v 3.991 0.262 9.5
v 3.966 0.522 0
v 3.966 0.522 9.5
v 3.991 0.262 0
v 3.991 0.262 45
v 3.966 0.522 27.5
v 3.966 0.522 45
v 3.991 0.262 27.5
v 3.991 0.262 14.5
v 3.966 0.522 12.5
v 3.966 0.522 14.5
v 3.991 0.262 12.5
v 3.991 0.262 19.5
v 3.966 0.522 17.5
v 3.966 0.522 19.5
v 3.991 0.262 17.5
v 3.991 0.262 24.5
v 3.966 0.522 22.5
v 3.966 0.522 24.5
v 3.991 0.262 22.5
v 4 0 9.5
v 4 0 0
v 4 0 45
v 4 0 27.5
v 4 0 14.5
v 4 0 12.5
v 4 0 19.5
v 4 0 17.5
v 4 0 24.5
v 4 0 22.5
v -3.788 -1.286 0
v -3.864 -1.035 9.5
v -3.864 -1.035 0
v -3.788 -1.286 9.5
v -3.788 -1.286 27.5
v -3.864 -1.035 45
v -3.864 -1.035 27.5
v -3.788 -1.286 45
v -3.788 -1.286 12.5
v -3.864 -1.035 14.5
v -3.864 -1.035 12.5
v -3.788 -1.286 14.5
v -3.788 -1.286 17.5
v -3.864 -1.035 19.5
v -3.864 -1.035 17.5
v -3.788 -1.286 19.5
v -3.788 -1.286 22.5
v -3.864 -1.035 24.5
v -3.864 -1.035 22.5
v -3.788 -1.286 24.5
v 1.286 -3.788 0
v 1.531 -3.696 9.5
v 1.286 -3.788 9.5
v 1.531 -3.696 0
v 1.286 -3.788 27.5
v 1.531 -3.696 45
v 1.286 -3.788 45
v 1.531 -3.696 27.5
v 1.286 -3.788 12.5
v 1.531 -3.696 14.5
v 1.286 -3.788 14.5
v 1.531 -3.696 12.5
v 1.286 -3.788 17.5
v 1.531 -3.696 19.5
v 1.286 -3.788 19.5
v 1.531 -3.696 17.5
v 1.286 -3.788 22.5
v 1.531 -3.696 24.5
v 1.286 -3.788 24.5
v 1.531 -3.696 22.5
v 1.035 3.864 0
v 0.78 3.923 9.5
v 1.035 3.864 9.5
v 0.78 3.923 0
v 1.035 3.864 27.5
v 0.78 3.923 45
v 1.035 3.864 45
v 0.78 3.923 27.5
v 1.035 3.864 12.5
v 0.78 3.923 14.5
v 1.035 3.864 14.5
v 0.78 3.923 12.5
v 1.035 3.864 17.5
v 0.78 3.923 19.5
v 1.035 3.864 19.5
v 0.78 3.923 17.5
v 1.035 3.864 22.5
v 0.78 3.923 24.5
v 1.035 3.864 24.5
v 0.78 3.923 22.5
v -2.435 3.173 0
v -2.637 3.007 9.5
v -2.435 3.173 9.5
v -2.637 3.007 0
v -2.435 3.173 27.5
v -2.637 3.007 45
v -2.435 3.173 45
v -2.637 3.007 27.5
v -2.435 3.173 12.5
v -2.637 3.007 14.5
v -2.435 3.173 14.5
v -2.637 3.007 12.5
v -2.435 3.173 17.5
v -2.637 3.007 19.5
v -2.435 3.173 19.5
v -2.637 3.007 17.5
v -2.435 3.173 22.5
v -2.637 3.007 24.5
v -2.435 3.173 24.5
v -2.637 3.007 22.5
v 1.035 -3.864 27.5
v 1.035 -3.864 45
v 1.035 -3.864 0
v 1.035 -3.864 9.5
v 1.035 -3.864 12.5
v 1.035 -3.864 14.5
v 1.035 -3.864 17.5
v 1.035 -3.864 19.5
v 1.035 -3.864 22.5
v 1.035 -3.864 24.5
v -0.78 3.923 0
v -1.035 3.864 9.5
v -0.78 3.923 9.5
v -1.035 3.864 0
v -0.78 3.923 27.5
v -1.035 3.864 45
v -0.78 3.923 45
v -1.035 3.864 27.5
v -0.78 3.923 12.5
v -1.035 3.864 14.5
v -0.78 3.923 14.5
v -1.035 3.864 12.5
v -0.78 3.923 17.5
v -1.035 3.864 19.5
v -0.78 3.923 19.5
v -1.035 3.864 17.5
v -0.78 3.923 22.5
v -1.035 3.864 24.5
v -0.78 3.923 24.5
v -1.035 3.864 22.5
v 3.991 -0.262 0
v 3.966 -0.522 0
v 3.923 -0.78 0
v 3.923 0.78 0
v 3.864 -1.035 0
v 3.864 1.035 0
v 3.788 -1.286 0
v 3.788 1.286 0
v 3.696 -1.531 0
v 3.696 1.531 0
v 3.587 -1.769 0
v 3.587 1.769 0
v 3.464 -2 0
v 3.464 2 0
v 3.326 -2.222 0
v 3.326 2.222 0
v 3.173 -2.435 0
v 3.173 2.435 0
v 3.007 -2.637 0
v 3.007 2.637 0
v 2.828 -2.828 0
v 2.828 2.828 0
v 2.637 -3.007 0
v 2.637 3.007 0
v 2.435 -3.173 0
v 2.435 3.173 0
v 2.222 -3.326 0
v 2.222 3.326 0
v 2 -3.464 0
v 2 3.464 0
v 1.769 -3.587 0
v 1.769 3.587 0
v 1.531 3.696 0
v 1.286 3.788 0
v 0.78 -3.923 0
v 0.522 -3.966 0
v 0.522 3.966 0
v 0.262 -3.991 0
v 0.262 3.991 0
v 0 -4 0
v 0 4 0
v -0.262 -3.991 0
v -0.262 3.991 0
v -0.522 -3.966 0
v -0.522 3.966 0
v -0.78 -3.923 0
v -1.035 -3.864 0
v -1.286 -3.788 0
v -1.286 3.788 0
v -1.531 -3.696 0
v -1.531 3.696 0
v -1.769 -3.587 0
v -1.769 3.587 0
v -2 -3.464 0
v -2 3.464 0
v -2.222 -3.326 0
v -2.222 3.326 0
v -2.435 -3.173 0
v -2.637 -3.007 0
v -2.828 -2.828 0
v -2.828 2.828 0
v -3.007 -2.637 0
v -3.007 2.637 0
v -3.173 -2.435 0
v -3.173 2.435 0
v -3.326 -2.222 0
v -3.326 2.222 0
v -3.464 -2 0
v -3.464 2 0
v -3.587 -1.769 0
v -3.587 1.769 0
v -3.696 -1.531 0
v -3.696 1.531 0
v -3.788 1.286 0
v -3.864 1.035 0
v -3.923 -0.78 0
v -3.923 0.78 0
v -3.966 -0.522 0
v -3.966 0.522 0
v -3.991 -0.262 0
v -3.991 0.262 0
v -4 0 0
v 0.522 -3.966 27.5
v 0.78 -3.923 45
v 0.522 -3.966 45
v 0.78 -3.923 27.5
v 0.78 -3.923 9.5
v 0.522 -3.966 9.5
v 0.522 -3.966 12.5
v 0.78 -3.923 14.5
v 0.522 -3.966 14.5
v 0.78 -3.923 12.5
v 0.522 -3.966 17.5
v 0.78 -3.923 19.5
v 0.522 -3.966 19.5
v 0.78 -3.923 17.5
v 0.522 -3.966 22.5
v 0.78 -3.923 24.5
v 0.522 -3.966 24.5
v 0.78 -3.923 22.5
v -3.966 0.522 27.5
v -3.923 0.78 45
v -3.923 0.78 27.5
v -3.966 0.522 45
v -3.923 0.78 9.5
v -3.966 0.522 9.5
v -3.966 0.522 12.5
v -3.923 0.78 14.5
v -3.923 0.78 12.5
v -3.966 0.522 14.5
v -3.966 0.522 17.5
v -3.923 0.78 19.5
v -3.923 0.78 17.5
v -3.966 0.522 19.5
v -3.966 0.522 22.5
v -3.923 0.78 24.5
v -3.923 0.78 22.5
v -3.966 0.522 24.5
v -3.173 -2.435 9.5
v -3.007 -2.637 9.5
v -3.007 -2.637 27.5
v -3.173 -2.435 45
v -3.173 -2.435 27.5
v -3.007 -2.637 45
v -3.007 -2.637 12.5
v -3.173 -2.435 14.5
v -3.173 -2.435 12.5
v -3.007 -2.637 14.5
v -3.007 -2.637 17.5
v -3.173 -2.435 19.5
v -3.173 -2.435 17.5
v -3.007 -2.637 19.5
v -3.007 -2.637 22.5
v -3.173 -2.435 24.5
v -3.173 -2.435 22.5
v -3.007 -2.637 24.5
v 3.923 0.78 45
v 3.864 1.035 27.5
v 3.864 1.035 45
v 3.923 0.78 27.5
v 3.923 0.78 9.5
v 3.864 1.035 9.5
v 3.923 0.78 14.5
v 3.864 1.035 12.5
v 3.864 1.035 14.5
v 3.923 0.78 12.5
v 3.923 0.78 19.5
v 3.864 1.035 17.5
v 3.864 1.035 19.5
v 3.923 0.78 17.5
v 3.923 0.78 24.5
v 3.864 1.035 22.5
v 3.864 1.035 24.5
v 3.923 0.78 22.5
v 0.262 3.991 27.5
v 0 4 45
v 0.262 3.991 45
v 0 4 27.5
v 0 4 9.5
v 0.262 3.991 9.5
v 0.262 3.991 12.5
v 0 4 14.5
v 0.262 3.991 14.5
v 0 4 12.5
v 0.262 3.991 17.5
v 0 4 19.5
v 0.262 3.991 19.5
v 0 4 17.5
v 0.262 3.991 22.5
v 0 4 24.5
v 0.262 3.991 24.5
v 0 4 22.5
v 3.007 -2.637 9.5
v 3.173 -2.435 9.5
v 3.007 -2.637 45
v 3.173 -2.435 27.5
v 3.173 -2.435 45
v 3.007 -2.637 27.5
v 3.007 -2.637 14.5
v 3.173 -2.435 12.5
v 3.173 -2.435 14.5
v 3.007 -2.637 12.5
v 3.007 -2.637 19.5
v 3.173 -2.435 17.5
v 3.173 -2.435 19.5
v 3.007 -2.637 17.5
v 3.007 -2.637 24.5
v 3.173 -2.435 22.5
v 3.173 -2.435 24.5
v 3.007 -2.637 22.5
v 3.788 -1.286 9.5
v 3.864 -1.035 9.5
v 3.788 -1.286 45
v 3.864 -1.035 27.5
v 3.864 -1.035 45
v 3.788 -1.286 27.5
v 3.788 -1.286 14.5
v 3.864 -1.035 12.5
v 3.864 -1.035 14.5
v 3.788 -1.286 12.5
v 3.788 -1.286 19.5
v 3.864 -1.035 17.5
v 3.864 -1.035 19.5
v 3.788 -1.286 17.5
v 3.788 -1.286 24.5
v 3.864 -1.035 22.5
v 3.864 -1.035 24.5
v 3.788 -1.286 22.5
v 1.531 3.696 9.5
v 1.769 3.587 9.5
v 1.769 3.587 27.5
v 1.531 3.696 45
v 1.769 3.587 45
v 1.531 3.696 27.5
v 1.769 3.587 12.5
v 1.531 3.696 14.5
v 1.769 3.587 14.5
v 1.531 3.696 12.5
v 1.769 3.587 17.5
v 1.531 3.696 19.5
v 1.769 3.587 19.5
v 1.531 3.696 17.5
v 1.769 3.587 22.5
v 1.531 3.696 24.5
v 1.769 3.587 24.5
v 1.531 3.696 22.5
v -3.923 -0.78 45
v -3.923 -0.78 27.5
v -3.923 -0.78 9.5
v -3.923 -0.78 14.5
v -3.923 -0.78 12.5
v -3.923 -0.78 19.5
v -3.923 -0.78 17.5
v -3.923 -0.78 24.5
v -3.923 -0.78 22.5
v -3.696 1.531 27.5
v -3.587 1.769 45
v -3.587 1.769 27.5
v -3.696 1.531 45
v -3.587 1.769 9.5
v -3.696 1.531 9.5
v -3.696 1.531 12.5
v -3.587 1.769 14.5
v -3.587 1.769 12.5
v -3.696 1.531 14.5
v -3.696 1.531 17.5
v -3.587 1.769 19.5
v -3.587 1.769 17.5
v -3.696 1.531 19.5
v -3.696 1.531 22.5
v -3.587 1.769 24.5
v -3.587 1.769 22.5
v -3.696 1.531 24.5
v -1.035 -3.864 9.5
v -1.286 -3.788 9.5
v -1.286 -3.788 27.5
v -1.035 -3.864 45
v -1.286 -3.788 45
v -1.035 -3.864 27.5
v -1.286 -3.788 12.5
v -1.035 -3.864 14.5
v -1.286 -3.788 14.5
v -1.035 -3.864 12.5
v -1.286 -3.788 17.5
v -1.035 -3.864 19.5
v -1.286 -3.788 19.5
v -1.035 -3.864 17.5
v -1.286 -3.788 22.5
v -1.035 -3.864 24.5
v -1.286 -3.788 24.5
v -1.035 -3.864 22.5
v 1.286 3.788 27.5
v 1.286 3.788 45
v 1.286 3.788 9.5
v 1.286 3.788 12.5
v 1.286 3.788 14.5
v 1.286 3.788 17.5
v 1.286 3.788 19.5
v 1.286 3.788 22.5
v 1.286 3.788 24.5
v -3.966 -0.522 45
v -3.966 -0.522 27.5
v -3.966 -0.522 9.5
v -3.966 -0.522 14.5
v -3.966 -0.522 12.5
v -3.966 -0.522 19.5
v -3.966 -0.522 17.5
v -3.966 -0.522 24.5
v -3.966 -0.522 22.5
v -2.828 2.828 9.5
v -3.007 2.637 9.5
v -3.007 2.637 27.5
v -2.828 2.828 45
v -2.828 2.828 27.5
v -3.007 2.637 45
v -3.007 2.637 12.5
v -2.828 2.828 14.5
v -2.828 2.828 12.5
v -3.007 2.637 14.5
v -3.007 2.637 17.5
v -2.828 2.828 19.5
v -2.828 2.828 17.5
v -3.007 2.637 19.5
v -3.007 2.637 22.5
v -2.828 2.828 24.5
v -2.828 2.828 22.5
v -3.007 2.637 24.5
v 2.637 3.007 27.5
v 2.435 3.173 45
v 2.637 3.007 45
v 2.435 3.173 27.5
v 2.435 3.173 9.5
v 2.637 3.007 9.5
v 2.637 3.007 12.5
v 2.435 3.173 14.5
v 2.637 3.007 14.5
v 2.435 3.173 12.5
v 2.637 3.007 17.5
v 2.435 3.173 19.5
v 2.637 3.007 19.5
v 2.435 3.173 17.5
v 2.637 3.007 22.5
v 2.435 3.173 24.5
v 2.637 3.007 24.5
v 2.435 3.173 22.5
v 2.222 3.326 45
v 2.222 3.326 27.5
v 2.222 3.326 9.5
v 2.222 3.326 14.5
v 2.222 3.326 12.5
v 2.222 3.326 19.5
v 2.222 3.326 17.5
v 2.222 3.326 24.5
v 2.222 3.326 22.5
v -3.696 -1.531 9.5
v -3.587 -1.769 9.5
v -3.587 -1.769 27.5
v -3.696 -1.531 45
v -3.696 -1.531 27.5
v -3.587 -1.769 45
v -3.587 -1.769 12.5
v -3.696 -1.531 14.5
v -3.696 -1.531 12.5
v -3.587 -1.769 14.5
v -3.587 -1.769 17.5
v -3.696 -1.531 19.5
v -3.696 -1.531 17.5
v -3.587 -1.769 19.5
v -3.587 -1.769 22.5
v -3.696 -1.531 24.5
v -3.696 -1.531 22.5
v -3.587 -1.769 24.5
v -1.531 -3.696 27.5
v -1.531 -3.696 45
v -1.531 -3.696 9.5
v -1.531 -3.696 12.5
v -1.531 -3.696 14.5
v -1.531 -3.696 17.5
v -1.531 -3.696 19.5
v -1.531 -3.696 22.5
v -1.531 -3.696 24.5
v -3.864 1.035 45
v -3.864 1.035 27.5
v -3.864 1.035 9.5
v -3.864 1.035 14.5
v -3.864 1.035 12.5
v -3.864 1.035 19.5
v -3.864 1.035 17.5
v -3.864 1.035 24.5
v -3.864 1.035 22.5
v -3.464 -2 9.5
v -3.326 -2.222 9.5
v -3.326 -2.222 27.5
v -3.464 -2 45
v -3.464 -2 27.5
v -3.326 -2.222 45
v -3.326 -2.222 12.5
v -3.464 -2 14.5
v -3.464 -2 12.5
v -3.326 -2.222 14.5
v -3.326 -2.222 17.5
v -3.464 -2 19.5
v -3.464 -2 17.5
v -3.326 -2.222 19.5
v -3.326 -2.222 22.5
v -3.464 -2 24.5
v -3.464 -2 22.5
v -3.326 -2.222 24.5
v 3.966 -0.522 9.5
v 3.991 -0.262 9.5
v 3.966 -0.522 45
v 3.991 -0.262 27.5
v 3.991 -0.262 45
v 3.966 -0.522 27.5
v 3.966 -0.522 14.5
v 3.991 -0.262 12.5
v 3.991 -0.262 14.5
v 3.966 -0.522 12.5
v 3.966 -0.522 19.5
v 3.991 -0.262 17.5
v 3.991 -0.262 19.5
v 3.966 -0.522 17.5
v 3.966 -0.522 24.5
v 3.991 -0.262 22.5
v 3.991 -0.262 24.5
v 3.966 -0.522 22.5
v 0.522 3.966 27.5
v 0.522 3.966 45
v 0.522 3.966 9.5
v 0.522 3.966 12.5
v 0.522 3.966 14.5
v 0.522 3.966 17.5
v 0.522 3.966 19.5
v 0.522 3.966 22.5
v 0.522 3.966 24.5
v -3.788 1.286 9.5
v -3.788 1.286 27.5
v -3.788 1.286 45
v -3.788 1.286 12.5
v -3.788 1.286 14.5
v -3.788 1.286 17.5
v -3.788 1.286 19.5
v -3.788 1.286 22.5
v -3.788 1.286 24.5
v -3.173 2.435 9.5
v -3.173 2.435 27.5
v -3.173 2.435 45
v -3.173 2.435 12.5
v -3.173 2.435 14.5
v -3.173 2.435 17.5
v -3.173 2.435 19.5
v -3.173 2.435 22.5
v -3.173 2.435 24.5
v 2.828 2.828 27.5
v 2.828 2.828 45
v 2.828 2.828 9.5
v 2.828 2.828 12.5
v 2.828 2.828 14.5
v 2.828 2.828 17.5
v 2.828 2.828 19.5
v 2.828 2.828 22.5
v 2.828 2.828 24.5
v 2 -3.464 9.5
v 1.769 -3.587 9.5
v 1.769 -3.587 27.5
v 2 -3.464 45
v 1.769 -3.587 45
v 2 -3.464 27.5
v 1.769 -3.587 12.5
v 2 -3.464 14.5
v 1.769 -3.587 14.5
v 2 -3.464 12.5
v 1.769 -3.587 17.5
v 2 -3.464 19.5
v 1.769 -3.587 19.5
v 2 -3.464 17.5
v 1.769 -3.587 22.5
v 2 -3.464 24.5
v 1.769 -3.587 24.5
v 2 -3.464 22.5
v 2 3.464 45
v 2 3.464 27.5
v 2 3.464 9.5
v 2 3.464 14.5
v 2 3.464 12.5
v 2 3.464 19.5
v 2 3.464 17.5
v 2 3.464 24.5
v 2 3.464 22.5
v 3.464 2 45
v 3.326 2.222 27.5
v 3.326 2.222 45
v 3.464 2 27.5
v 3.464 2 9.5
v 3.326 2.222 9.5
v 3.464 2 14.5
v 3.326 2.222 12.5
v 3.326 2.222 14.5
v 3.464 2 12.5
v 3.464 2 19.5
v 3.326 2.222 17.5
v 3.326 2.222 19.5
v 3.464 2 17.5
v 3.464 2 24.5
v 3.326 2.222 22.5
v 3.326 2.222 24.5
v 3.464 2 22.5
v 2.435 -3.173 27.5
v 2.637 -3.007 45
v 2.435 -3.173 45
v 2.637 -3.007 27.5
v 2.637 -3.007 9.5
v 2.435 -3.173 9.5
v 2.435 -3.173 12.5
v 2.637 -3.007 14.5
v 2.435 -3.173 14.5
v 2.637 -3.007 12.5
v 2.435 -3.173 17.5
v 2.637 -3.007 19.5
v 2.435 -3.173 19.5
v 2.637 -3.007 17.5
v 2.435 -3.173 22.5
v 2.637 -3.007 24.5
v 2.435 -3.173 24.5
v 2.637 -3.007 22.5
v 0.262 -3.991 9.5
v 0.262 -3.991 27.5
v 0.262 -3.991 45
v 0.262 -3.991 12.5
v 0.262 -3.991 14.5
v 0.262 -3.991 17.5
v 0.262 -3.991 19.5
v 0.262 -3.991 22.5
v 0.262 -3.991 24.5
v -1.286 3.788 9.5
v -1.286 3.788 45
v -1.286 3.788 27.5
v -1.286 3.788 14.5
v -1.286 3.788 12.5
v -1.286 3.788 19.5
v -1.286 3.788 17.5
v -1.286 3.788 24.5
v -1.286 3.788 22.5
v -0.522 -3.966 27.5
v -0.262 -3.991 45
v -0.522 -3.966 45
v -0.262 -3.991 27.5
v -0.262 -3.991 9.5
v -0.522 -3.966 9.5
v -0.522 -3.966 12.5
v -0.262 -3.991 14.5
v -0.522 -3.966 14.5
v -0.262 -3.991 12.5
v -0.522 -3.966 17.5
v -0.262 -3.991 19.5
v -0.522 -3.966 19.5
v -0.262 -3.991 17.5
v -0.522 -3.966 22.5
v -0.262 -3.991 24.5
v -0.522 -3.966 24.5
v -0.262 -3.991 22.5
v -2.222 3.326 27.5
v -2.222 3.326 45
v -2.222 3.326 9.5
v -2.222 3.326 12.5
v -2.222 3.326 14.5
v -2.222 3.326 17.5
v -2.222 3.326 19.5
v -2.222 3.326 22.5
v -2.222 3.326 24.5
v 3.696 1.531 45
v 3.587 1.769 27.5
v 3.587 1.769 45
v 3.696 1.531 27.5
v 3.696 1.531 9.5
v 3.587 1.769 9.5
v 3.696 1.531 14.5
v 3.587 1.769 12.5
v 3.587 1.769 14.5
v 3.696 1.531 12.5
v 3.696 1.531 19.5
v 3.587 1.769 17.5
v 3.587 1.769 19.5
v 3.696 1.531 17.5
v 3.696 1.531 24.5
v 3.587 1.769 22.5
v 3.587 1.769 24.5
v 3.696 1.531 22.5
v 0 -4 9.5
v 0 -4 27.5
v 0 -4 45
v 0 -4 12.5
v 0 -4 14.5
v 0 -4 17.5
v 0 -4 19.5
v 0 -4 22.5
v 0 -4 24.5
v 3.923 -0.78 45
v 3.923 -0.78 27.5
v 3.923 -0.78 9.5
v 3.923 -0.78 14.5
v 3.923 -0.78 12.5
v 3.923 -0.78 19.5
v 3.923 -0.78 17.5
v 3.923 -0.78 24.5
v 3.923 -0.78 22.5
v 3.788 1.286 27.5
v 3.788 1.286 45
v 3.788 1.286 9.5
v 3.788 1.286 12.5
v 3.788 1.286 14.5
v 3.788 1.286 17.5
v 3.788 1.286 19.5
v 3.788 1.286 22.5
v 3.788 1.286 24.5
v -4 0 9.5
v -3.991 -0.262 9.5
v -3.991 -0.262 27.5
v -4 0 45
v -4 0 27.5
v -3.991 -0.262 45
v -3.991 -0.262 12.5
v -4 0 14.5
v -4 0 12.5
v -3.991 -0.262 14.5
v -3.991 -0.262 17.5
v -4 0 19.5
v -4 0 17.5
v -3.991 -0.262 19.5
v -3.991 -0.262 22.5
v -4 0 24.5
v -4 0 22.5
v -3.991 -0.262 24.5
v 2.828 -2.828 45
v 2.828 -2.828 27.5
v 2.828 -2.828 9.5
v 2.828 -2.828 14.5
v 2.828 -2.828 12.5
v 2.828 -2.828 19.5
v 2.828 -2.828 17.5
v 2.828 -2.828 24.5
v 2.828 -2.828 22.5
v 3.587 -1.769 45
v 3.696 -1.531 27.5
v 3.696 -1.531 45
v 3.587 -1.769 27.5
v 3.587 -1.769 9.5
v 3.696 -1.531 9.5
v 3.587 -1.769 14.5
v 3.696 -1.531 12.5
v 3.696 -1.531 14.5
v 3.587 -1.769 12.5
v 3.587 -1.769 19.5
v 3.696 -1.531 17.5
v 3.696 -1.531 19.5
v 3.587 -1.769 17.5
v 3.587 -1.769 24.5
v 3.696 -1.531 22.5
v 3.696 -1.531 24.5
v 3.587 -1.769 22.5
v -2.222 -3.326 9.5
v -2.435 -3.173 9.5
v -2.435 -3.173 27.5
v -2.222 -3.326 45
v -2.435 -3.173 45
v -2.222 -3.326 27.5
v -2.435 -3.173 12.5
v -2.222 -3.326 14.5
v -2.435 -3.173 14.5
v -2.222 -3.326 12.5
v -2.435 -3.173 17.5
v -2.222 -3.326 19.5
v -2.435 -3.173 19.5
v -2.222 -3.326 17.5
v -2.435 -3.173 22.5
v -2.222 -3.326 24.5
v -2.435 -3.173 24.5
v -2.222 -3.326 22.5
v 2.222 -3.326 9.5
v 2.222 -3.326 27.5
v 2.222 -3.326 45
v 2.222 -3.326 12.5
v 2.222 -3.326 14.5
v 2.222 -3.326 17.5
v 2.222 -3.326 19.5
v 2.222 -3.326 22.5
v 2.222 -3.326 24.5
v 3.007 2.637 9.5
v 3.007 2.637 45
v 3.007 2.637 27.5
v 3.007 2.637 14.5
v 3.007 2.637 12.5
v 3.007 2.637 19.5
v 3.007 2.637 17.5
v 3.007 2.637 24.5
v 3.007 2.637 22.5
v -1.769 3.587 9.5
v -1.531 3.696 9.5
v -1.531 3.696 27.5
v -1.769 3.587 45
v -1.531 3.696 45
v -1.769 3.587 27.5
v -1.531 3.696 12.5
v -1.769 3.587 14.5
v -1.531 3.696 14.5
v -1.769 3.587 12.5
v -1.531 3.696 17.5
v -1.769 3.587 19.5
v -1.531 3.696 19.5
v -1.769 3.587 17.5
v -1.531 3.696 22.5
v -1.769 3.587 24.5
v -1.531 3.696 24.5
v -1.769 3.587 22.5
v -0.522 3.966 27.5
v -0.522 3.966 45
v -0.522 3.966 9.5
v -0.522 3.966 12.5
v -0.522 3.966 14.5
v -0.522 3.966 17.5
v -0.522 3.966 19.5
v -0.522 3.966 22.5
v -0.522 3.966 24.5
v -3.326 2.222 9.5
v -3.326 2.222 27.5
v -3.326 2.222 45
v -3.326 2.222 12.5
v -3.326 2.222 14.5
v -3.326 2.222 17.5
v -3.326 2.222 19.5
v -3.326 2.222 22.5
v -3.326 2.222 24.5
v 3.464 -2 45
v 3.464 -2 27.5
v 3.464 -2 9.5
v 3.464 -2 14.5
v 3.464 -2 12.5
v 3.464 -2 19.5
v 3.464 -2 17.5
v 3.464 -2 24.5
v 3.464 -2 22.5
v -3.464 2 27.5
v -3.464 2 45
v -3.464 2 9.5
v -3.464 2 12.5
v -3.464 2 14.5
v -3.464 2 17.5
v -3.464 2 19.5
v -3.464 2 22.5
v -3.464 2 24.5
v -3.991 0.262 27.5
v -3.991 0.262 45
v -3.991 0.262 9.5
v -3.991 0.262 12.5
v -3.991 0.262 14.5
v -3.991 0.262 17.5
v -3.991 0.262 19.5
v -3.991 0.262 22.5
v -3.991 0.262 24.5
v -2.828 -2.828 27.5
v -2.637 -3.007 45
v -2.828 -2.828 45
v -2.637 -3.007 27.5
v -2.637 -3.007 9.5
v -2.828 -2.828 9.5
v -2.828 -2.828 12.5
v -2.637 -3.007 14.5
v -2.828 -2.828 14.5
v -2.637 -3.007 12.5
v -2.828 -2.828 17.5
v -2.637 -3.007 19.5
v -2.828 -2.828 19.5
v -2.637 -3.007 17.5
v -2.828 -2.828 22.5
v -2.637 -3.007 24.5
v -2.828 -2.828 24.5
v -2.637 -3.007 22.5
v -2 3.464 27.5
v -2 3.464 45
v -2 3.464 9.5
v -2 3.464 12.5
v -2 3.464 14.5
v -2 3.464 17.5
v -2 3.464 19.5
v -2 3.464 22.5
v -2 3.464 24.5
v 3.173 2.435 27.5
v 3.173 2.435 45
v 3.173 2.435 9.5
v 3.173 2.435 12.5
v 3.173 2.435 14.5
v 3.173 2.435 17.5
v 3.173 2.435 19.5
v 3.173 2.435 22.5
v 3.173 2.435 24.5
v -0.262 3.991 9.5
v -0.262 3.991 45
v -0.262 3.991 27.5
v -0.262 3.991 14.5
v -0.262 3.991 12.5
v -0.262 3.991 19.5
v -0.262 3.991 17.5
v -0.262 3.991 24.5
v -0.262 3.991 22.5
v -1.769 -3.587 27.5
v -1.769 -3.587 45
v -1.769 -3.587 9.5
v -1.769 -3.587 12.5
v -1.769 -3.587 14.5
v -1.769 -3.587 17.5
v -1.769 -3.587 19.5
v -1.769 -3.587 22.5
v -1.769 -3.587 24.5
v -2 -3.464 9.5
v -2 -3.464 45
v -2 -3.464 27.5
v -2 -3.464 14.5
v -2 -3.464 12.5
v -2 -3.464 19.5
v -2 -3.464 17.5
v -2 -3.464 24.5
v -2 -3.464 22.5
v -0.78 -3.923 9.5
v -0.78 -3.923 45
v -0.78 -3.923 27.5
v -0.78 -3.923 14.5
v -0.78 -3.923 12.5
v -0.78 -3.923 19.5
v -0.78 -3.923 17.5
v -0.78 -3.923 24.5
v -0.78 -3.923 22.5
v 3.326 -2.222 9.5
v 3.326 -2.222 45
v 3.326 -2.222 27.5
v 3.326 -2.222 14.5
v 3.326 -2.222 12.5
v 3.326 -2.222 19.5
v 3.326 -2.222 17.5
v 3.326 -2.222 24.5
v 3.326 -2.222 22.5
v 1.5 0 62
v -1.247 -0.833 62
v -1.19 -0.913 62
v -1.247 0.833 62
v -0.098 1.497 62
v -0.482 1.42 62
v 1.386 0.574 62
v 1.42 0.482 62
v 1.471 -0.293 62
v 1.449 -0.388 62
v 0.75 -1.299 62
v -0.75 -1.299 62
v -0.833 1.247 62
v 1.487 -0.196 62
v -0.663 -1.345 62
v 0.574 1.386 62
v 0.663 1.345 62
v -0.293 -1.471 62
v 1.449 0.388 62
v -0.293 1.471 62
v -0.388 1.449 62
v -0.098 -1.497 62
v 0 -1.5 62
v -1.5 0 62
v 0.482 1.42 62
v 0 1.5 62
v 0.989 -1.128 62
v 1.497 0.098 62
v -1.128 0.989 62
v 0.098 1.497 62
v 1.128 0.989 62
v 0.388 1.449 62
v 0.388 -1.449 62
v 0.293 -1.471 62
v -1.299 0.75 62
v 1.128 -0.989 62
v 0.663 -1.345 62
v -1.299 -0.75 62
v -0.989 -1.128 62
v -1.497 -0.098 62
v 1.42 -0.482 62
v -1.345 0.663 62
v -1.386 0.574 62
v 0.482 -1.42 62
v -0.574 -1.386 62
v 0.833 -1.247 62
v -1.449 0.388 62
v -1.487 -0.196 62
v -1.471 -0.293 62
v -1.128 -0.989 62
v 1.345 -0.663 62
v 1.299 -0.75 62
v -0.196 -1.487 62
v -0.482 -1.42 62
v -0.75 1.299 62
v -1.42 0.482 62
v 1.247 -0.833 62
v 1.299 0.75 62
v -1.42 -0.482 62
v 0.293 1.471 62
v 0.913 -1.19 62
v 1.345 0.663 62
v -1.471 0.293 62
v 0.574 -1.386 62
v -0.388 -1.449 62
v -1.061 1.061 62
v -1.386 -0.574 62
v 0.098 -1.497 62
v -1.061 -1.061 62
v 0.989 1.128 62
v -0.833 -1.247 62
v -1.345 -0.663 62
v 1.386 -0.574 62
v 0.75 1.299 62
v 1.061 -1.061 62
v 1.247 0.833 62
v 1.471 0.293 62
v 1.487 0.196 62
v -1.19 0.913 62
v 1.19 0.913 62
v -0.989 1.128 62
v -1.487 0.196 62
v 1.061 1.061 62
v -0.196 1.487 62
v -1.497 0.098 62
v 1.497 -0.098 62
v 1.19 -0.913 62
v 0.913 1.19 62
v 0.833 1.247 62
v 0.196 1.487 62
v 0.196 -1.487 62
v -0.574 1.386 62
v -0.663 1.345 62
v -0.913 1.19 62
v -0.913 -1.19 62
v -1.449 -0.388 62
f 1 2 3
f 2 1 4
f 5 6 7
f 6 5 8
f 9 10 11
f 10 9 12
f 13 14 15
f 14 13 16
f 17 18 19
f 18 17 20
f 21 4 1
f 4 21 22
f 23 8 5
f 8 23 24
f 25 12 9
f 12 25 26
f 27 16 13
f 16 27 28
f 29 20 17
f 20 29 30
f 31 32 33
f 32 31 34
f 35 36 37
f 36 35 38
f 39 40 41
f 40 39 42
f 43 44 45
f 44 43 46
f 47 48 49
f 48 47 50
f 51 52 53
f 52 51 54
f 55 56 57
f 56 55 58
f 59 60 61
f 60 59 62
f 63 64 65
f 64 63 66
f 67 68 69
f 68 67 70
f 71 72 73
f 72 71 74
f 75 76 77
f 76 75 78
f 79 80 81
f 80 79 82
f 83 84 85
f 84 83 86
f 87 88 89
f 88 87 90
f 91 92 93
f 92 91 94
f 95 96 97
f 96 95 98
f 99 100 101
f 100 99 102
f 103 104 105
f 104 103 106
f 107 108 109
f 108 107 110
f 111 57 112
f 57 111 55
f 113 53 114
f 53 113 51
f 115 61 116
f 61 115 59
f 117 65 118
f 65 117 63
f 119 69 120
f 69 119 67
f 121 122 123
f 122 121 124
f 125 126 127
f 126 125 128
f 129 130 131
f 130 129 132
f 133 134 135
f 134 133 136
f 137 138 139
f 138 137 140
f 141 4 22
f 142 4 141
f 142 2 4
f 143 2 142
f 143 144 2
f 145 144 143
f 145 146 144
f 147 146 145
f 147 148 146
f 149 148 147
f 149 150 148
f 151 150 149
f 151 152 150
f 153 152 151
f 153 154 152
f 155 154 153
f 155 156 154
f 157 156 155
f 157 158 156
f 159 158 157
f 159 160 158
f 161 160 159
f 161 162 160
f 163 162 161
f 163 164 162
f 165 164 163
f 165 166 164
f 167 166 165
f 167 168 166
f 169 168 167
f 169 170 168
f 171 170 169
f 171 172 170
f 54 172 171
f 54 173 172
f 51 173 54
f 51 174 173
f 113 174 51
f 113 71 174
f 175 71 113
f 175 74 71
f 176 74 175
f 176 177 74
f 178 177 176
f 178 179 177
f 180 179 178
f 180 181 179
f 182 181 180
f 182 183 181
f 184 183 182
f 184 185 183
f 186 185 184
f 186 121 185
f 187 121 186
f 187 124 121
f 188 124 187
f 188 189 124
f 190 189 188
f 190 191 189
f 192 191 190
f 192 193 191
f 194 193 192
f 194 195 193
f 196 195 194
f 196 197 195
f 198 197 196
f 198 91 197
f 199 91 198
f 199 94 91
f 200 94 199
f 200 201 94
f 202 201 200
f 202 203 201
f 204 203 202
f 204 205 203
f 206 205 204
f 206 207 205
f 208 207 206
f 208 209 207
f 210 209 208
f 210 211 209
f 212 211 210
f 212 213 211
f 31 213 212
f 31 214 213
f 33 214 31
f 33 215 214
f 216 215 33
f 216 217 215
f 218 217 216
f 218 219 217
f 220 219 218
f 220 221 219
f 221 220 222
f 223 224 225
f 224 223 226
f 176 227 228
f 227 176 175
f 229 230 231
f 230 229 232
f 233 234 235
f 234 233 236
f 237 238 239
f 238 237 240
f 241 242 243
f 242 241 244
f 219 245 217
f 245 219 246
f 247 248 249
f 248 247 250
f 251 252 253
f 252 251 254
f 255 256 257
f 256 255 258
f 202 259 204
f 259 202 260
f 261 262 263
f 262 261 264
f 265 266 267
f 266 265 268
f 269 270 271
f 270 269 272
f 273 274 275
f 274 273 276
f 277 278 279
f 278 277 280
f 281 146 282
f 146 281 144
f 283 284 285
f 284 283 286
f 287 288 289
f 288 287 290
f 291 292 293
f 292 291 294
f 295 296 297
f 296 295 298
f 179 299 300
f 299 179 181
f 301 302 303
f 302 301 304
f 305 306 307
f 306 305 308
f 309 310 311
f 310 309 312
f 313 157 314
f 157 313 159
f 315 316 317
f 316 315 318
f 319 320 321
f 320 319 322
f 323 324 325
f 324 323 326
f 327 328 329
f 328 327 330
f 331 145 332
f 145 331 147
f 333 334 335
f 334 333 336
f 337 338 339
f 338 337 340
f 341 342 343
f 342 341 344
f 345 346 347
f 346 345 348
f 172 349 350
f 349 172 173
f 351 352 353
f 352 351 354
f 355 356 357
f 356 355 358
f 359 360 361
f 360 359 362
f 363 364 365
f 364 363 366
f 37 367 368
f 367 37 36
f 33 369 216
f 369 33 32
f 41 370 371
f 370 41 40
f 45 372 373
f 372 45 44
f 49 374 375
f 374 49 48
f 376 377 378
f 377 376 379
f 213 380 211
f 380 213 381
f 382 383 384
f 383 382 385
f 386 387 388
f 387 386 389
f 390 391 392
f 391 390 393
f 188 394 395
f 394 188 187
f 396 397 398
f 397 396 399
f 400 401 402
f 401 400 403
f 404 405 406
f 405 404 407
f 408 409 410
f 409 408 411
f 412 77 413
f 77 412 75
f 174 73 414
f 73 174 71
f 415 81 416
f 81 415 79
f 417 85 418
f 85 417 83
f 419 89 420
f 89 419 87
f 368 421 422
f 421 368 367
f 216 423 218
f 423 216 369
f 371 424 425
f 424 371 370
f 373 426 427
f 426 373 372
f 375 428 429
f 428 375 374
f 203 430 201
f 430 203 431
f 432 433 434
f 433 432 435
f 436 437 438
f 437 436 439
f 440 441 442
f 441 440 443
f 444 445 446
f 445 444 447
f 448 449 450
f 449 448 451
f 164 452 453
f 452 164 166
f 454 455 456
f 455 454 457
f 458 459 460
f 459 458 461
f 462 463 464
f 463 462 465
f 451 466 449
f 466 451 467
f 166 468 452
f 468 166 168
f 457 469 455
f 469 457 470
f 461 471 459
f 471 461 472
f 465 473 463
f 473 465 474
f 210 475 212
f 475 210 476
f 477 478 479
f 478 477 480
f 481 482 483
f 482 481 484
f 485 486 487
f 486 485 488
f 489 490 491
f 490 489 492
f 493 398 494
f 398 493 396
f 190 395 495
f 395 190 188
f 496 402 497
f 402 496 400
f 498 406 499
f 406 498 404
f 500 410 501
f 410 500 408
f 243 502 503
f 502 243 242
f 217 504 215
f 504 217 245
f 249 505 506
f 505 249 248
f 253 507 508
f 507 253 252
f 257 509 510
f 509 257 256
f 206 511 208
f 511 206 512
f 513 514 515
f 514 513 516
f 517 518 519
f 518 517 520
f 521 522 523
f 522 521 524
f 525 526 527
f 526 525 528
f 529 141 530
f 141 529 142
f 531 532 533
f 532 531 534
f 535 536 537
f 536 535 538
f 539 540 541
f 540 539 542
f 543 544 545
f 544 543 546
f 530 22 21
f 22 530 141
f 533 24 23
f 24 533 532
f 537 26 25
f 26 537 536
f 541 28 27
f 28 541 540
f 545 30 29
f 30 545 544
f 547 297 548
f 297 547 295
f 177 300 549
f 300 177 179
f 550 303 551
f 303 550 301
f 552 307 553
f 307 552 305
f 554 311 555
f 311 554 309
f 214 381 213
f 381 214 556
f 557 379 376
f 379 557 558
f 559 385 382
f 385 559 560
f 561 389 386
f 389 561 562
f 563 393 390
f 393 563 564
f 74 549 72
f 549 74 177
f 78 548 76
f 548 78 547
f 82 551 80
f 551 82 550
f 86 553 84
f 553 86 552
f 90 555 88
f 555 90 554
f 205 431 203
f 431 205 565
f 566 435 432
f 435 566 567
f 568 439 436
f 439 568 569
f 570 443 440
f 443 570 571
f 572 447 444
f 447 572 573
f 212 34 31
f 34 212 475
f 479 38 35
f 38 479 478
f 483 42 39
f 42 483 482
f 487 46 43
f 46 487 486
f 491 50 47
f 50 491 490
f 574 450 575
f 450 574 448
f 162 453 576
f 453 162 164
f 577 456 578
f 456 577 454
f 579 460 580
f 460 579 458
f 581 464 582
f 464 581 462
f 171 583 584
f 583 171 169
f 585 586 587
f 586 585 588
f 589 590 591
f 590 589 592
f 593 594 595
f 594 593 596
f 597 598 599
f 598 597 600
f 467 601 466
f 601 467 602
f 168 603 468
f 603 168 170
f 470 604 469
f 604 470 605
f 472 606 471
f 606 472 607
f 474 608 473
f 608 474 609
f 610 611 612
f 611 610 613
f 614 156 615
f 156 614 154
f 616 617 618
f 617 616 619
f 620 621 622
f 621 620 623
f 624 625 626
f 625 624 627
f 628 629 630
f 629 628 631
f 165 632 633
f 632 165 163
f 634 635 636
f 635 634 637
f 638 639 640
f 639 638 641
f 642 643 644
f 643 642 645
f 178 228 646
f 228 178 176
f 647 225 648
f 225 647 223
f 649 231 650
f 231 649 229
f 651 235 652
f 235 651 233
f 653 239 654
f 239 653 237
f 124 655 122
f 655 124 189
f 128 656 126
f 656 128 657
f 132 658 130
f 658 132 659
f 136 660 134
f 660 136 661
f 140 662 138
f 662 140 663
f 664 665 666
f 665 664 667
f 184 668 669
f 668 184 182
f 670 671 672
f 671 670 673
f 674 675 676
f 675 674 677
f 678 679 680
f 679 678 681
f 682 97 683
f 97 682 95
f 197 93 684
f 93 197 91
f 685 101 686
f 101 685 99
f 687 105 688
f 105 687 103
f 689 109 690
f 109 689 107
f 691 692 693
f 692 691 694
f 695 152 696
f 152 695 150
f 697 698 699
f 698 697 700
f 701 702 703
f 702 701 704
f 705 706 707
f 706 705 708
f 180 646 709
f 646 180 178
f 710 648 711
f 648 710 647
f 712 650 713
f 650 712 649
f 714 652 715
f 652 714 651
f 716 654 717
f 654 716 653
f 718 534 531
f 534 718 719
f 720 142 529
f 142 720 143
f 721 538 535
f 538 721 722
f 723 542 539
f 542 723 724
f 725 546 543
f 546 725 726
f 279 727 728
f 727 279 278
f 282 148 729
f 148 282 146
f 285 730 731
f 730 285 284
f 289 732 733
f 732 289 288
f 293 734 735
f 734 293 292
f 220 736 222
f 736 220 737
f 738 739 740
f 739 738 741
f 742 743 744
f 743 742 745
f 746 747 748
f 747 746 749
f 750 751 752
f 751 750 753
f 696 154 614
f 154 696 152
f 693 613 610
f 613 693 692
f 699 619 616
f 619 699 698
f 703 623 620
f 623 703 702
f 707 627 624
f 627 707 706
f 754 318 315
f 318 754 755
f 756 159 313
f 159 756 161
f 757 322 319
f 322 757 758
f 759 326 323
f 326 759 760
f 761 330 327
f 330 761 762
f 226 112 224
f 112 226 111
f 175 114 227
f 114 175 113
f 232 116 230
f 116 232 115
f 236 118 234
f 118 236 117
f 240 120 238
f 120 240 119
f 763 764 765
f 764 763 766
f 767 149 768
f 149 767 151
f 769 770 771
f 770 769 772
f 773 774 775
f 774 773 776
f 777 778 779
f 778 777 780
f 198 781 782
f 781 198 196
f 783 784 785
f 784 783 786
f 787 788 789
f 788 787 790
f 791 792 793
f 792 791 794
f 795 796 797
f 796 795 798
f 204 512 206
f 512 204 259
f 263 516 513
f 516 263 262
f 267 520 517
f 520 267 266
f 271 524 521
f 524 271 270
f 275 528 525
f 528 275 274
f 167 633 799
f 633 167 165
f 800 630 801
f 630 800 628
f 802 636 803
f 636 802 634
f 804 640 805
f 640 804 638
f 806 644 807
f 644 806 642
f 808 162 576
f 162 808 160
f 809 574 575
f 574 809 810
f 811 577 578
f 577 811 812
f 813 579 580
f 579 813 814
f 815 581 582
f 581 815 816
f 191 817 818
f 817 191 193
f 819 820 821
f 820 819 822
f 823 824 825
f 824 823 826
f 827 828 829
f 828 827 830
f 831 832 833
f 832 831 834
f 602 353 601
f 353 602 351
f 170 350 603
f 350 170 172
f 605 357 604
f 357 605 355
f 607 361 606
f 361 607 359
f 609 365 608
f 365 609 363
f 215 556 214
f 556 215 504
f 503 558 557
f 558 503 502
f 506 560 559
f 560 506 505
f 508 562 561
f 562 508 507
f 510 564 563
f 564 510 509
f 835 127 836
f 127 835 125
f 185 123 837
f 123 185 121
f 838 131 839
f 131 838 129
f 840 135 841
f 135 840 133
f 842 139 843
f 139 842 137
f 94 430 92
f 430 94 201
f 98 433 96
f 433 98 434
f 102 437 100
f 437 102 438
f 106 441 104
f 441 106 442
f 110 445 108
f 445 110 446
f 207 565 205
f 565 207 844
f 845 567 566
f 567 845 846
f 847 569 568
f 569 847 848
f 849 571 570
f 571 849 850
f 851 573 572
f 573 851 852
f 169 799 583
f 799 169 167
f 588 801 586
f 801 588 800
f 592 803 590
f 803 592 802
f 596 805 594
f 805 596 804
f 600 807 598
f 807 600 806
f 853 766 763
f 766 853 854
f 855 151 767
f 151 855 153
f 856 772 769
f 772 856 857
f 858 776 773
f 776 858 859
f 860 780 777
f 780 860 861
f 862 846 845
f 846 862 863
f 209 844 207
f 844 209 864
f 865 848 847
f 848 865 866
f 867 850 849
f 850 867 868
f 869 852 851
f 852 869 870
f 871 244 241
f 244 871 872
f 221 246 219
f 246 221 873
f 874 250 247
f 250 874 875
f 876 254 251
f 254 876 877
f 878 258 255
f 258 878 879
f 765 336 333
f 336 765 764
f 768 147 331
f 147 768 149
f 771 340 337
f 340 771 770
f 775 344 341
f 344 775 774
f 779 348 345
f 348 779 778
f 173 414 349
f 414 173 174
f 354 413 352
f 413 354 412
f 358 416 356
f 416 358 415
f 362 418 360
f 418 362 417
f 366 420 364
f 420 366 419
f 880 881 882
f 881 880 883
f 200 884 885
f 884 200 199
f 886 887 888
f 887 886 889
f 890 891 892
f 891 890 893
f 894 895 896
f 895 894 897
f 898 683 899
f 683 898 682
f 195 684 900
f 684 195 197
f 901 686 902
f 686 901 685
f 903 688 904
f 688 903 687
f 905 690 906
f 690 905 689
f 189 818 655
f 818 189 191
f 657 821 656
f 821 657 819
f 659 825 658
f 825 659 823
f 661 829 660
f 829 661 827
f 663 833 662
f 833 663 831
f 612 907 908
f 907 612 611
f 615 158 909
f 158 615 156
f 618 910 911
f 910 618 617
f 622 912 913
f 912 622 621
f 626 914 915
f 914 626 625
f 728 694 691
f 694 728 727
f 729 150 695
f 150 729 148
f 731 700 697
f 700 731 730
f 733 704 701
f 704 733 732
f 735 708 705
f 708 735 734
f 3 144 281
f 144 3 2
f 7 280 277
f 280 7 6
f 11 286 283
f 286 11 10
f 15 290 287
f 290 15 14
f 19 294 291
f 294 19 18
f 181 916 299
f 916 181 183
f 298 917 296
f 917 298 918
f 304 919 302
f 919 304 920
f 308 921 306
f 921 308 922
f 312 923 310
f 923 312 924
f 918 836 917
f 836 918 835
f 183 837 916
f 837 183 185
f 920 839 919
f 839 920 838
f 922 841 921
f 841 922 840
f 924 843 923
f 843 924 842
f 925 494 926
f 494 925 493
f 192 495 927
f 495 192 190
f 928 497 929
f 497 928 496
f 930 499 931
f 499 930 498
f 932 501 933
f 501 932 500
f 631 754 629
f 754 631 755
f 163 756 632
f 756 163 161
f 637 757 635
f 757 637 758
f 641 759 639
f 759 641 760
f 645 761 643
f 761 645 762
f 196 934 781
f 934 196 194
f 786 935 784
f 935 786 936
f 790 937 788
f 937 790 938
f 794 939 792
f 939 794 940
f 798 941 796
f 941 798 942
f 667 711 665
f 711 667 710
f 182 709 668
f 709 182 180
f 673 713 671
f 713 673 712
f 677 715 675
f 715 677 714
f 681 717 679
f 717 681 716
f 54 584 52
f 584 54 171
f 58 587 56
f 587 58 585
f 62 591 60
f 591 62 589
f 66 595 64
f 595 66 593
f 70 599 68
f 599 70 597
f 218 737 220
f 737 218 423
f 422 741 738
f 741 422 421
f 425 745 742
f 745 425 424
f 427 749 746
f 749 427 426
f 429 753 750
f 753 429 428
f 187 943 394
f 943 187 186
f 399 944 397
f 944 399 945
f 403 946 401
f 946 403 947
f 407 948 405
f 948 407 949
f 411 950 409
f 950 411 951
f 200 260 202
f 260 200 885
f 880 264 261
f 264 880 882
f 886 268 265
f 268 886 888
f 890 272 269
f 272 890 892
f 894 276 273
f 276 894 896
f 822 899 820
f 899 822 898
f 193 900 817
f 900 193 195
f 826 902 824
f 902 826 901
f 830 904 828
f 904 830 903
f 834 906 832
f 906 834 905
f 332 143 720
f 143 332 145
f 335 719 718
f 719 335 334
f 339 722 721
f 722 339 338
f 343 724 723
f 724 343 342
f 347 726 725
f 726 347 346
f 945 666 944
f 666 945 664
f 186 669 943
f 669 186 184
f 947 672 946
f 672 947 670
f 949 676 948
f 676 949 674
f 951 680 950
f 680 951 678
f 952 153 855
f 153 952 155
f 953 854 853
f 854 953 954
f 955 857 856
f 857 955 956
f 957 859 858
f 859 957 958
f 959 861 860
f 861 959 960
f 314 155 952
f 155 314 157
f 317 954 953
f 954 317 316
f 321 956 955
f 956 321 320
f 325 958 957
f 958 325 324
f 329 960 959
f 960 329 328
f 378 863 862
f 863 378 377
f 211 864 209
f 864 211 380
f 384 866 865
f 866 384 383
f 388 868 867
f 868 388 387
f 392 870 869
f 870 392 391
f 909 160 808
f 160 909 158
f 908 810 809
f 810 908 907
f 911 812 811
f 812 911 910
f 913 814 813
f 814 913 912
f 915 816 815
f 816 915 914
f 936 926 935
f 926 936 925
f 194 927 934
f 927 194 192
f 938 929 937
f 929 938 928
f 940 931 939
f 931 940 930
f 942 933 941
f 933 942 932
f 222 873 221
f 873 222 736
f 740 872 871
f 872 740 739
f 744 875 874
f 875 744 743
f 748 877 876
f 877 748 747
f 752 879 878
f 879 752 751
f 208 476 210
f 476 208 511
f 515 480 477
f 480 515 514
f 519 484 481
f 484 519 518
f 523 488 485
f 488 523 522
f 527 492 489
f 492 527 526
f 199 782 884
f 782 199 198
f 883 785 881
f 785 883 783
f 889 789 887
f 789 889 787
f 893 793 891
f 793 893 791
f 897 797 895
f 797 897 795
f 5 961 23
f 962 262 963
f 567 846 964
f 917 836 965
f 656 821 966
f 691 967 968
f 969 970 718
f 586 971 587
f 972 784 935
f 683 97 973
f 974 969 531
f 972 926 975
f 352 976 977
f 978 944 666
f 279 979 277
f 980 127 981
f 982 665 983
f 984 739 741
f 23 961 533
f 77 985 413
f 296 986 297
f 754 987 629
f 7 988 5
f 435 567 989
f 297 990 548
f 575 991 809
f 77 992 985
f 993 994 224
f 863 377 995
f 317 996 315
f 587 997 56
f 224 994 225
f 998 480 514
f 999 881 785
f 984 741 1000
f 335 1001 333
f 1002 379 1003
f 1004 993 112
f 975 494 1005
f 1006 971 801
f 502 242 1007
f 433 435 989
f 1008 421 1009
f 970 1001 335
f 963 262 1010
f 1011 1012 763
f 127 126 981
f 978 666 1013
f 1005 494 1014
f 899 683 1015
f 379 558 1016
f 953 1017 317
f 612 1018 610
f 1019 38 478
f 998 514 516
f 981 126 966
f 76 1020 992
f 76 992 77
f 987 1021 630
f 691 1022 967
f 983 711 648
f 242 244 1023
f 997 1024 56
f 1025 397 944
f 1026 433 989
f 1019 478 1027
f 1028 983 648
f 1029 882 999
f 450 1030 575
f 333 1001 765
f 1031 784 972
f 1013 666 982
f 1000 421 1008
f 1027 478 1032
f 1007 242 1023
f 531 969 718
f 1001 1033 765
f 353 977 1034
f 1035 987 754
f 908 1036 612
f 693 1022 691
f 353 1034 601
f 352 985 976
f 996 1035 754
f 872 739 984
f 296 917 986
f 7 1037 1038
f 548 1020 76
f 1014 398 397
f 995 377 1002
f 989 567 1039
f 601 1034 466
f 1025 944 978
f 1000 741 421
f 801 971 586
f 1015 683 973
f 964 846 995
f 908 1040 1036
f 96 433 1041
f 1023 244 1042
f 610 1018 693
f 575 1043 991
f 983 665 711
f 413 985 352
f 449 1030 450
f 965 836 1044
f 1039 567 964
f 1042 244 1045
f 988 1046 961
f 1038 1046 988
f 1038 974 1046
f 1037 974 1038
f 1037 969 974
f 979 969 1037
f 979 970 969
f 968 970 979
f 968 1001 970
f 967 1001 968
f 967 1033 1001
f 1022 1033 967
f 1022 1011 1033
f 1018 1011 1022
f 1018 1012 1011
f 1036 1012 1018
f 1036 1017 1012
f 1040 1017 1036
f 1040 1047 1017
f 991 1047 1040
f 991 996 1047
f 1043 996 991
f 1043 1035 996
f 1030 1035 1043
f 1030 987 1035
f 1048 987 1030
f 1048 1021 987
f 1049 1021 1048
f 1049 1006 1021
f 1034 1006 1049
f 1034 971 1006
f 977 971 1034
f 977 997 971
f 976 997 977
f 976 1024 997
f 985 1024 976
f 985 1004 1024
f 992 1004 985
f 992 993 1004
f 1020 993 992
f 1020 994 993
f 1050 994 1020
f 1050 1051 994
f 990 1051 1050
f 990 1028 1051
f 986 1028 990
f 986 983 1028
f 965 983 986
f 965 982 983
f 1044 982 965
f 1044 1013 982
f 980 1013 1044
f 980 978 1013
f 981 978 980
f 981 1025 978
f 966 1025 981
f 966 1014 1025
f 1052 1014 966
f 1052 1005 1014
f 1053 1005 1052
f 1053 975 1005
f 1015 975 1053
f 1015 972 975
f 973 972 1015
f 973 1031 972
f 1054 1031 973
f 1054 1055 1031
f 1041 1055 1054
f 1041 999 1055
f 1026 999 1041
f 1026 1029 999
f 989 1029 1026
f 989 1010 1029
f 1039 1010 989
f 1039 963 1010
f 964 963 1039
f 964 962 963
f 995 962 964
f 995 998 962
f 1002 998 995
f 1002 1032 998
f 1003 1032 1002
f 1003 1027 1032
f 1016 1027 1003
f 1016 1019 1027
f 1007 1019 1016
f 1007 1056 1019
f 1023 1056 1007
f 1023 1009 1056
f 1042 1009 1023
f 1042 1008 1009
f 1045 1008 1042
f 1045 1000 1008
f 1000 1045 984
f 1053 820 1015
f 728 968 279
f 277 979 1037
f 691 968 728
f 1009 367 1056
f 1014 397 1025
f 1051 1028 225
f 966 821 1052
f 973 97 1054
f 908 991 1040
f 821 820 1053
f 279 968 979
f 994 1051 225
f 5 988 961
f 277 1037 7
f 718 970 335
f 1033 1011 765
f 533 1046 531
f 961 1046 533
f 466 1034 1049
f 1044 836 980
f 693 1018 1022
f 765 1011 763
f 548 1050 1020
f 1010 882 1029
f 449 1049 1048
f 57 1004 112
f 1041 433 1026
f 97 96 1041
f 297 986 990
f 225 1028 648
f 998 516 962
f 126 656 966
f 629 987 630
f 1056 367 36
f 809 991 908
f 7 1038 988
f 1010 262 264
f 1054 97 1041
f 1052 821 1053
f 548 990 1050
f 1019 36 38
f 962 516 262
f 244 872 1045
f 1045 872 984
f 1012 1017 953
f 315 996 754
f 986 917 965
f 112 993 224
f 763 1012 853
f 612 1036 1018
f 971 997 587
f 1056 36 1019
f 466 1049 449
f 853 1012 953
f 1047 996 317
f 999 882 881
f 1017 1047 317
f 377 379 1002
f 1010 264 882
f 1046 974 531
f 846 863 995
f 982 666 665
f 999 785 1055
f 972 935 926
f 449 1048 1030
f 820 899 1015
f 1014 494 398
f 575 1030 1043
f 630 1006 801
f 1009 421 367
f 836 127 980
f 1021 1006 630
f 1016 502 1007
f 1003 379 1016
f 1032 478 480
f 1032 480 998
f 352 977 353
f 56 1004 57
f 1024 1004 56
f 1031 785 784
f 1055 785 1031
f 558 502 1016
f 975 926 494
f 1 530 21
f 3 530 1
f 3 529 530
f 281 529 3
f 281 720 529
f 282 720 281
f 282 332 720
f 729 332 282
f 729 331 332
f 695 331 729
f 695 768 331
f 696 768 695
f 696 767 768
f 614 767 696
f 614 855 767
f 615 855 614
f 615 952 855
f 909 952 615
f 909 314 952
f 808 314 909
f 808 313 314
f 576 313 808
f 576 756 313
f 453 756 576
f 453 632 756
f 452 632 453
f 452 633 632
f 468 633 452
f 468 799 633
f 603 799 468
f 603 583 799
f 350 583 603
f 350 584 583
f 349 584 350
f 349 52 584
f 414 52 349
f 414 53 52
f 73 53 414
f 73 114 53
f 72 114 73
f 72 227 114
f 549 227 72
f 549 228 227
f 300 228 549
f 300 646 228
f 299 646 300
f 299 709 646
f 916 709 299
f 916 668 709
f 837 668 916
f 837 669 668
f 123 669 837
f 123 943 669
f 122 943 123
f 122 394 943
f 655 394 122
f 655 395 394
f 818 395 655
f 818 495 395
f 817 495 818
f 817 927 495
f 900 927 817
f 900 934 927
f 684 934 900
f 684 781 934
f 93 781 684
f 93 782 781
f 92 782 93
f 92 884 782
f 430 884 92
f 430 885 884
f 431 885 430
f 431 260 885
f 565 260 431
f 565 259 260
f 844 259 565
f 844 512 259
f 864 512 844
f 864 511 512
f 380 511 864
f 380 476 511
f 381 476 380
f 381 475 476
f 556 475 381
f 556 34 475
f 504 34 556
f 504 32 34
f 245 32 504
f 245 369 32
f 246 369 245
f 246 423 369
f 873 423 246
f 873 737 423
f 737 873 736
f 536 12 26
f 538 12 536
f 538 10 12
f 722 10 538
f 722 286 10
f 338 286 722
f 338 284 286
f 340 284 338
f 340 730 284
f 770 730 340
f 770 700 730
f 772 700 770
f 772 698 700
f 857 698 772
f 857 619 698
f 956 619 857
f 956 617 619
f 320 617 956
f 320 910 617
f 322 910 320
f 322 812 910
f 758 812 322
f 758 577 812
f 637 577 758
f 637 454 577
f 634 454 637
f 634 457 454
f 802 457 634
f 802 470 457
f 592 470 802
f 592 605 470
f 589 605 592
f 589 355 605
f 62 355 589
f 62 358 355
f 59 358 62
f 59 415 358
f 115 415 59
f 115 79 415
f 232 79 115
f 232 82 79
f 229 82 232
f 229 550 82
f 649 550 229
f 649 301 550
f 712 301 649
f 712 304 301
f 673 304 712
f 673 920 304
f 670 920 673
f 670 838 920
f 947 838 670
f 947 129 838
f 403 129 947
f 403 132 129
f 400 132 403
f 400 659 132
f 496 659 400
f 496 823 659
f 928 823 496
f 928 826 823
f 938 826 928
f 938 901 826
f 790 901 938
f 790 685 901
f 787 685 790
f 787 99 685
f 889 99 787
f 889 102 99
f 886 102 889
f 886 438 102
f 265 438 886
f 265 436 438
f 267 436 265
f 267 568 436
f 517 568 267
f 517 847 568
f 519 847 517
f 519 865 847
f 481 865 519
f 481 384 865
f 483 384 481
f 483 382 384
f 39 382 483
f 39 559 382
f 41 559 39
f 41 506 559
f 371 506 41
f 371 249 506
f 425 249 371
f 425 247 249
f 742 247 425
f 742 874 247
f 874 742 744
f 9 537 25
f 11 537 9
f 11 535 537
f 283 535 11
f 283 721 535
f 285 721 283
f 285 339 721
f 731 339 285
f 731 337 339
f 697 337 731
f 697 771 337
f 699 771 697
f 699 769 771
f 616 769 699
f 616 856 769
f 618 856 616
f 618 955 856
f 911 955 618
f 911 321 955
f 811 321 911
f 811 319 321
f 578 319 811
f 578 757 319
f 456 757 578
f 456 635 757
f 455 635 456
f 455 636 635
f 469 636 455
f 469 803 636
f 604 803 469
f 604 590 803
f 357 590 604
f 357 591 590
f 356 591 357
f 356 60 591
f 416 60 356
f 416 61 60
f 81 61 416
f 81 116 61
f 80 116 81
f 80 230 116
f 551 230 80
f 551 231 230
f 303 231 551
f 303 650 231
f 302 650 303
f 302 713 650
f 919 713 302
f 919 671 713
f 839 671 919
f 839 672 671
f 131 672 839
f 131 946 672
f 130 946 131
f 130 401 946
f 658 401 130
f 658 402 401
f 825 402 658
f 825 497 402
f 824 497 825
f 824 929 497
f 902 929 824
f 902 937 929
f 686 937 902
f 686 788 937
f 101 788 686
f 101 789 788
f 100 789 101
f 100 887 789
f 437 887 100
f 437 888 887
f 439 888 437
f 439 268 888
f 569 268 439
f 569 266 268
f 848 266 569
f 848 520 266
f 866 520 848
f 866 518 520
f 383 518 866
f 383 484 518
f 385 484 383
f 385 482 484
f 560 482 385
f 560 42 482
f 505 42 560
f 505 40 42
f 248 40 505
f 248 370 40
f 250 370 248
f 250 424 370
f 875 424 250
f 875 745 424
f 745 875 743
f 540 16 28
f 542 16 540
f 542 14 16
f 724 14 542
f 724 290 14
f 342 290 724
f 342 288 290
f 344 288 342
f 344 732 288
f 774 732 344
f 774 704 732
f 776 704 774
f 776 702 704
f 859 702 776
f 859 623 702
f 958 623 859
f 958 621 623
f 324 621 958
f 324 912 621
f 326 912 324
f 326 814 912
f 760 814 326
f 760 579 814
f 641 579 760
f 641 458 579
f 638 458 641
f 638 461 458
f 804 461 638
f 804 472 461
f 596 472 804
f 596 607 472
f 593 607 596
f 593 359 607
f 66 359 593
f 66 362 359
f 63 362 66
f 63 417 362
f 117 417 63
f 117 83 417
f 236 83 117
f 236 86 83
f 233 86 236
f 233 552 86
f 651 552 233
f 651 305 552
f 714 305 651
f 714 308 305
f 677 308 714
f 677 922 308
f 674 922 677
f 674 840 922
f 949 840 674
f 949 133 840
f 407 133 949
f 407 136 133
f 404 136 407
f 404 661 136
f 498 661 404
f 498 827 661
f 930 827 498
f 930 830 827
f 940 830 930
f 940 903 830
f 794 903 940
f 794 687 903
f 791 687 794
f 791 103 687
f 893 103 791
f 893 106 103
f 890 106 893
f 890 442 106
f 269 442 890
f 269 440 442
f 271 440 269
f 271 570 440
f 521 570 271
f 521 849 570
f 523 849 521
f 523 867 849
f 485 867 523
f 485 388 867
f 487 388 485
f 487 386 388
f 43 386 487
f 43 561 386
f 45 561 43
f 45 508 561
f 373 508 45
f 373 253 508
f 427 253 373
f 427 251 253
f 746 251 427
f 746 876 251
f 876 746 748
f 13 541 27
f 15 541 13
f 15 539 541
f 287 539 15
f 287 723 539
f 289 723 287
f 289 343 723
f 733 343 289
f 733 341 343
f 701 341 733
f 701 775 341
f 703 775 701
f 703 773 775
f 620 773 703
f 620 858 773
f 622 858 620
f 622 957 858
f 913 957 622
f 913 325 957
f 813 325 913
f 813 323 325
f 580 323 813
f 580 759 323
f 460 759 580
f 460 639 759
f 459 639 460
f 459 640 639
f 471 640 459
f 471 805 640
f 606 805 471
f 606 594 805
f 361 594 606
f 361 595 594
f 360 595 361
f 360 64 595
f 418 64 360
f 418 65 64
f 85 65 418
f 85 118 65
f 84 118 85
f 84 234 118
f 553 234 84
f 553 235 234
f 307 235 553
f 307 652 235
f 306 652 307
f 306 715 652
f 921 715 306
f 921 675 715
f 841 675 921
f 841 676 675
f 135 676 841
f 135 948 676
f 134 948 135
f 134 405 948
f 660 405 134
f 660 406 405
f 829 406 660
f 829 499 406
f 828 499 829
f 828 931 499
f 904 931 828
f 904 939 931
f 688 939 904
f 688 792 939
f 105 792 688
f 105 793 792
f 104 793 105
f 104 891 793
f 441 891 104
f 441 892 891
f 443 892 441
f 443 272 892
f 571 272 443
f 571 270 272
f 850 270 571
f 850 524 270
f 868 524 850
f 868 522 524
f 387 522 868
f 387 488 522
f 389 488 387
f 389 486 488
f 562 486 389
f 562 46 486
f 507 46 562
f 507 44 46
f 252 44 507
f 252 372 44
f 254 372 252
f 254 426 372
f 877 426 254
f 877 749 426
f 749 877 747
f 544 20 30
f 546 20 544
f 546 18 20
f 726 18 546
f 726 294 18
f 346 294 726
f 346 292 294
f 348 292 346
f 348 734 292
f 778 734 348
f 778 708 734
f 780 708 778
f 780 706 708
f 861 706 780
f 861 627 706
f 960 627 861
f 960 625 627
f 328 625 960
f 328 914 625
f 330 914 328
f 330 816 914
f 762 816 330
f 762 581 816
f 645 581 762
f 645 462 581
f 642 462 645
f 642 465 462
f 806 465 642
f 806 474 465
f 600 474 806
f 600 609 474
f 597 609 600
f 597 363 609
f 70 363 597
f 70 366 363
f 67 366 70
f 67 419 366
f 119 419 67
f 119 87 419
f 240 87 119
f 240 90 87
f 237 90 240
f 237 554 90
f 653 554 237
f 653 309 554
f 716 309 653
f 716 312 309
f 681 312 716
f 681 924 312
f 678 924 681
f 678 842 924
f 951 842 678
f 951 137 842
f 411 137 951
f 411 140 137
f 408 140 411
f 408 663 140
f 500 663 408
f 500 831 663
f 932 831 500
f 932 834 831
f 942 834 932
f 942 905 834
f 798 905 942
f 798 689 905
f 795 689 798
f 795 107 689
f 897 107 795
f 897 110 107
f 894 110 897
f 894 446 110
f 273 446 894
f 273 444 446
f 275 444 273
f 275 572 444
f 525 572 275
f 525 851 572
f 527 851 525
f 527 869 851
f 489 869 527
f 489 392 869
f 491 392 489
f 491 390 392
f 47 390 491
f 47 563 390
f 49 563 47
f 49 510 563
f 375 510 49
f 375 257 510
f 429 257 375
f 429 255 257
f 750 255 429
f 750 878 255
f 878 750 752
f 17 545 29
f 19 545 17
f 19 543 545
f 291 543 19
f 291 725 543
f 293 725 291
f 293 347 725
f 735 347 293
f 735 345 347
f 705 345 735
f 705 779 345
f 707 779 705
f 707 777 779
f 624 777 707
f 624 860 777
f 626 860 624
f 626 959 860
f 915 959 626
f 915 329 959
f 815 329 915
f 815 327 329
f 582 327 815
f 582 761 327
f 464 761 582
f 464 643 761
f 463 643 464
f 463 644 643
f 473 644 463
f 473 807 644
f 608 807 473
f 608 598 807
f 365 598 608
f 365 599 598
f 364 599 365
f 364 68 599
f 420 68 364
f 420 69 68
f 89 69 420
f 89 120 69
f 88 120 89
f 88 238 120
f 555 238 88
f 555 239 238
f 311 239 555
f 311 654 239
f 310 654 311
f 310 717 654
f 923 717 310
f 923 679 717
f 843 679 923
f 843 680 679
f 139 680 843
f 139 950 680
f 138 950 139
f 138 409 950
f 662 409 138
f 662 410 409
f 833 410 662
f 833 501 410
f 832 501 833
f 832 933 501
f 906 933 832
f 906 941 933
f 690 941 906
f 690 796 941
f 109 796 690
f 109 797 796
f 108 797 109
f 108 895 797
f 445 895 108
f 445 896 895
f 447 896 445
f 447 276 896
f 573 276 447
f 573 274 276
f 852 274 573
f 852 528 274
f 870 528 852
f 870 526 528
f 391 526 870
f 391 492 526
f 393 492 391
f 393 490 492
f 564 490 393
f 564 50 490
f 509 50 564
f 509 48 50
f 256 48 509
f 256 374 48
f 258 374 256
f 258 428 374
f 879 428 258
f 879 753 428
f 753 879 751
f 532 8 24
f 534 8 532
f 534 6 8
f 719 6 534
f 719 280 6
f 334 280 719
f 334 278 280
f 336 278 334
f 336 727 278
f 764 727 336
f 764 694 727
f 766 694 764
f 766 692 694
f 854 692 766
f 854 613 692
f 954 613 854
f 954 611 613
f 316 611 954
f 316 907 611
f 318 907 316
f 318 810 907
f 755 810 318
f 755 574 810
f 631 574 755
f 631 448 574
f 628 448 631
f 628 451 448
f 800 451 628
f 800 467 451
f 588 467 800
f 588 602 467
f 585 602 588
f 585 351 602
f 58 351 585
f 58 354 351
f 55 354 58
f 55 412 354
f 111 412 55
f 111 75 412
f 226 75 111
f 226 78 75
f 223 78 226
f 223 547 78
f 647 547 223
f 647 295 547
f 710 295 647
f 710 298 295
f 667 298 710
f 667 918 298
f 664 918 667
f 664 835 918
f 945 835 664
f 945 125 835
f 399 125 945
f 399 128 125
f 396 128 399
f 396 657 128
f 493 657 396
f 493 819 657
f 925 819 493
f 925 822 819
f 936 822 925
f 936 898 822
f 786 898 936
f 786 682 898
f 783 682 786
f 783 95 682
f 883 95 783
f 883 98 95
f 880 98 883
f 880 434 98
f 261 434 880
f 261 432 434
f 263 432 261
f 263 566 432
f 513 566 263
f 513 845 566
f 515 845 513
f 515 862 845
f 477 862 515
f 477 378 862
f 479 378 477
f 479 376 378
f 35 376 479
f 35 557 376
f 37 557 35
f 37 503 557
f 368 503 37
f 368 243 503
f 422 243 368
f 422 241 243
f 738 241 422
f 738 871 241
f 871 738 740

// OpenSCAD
// Pestle for grinding tissue in a 1.5 mL microcentrifuge tube
// Print orientation: standing upright, handle at the bottom

// ---------------- Parameters ----------------
handle_d      = 8;     // handle diameter (mm)
handle_h      = 45;    // handle height, z = 0 to 45 (mm)

cone_top_d    = 8;     // cone top diameter at z = 45 (mm)
cone_bottom_d = 3;     // cone bottom diameter at z = 62 (mm)
cone_h        = 17;    // cone height, z = 45 to 62 (mm)

tip_d         = 3;     // tip sphere diameter (mm)
tip_z         = 62;    // tip sphere centre height (mm)

groove_w      = 2;     // groove width in Z (mm)
groove_depth  = 1;     // groove depth from surface (mm)
groove_z      = [10, 15, 20, 25]; // groove centre heights (mm)

overcut       = 0.5;   // extra length of cutters past faces (mm)
$fn           = 96;    // curve resolution

// ---------------- Model ----------------
difference() {
    union() {
        // (1) Cylindrical handle
        cylinder(d = handle_d, h = handle_h);

        // (2) Tapering cone
        translate([0, 0, handle_h])
            cylinder(d1 = cone_top_d, d2 = cone_bottom_d, h = cone_h);

        // (3) Rounded tip sphere
        translate([0, 0, tip_z - tip_d / 2])
            sphere(d = tip_d);
    }

    // Grip grooves in the handle
    for (z = groove_z)
        translate([0, 0, z - overcut])
            cylinder(d = handle_d + 2 * groove_depth, h = groove_w + 2 * overcut, $fn = 64);
}
